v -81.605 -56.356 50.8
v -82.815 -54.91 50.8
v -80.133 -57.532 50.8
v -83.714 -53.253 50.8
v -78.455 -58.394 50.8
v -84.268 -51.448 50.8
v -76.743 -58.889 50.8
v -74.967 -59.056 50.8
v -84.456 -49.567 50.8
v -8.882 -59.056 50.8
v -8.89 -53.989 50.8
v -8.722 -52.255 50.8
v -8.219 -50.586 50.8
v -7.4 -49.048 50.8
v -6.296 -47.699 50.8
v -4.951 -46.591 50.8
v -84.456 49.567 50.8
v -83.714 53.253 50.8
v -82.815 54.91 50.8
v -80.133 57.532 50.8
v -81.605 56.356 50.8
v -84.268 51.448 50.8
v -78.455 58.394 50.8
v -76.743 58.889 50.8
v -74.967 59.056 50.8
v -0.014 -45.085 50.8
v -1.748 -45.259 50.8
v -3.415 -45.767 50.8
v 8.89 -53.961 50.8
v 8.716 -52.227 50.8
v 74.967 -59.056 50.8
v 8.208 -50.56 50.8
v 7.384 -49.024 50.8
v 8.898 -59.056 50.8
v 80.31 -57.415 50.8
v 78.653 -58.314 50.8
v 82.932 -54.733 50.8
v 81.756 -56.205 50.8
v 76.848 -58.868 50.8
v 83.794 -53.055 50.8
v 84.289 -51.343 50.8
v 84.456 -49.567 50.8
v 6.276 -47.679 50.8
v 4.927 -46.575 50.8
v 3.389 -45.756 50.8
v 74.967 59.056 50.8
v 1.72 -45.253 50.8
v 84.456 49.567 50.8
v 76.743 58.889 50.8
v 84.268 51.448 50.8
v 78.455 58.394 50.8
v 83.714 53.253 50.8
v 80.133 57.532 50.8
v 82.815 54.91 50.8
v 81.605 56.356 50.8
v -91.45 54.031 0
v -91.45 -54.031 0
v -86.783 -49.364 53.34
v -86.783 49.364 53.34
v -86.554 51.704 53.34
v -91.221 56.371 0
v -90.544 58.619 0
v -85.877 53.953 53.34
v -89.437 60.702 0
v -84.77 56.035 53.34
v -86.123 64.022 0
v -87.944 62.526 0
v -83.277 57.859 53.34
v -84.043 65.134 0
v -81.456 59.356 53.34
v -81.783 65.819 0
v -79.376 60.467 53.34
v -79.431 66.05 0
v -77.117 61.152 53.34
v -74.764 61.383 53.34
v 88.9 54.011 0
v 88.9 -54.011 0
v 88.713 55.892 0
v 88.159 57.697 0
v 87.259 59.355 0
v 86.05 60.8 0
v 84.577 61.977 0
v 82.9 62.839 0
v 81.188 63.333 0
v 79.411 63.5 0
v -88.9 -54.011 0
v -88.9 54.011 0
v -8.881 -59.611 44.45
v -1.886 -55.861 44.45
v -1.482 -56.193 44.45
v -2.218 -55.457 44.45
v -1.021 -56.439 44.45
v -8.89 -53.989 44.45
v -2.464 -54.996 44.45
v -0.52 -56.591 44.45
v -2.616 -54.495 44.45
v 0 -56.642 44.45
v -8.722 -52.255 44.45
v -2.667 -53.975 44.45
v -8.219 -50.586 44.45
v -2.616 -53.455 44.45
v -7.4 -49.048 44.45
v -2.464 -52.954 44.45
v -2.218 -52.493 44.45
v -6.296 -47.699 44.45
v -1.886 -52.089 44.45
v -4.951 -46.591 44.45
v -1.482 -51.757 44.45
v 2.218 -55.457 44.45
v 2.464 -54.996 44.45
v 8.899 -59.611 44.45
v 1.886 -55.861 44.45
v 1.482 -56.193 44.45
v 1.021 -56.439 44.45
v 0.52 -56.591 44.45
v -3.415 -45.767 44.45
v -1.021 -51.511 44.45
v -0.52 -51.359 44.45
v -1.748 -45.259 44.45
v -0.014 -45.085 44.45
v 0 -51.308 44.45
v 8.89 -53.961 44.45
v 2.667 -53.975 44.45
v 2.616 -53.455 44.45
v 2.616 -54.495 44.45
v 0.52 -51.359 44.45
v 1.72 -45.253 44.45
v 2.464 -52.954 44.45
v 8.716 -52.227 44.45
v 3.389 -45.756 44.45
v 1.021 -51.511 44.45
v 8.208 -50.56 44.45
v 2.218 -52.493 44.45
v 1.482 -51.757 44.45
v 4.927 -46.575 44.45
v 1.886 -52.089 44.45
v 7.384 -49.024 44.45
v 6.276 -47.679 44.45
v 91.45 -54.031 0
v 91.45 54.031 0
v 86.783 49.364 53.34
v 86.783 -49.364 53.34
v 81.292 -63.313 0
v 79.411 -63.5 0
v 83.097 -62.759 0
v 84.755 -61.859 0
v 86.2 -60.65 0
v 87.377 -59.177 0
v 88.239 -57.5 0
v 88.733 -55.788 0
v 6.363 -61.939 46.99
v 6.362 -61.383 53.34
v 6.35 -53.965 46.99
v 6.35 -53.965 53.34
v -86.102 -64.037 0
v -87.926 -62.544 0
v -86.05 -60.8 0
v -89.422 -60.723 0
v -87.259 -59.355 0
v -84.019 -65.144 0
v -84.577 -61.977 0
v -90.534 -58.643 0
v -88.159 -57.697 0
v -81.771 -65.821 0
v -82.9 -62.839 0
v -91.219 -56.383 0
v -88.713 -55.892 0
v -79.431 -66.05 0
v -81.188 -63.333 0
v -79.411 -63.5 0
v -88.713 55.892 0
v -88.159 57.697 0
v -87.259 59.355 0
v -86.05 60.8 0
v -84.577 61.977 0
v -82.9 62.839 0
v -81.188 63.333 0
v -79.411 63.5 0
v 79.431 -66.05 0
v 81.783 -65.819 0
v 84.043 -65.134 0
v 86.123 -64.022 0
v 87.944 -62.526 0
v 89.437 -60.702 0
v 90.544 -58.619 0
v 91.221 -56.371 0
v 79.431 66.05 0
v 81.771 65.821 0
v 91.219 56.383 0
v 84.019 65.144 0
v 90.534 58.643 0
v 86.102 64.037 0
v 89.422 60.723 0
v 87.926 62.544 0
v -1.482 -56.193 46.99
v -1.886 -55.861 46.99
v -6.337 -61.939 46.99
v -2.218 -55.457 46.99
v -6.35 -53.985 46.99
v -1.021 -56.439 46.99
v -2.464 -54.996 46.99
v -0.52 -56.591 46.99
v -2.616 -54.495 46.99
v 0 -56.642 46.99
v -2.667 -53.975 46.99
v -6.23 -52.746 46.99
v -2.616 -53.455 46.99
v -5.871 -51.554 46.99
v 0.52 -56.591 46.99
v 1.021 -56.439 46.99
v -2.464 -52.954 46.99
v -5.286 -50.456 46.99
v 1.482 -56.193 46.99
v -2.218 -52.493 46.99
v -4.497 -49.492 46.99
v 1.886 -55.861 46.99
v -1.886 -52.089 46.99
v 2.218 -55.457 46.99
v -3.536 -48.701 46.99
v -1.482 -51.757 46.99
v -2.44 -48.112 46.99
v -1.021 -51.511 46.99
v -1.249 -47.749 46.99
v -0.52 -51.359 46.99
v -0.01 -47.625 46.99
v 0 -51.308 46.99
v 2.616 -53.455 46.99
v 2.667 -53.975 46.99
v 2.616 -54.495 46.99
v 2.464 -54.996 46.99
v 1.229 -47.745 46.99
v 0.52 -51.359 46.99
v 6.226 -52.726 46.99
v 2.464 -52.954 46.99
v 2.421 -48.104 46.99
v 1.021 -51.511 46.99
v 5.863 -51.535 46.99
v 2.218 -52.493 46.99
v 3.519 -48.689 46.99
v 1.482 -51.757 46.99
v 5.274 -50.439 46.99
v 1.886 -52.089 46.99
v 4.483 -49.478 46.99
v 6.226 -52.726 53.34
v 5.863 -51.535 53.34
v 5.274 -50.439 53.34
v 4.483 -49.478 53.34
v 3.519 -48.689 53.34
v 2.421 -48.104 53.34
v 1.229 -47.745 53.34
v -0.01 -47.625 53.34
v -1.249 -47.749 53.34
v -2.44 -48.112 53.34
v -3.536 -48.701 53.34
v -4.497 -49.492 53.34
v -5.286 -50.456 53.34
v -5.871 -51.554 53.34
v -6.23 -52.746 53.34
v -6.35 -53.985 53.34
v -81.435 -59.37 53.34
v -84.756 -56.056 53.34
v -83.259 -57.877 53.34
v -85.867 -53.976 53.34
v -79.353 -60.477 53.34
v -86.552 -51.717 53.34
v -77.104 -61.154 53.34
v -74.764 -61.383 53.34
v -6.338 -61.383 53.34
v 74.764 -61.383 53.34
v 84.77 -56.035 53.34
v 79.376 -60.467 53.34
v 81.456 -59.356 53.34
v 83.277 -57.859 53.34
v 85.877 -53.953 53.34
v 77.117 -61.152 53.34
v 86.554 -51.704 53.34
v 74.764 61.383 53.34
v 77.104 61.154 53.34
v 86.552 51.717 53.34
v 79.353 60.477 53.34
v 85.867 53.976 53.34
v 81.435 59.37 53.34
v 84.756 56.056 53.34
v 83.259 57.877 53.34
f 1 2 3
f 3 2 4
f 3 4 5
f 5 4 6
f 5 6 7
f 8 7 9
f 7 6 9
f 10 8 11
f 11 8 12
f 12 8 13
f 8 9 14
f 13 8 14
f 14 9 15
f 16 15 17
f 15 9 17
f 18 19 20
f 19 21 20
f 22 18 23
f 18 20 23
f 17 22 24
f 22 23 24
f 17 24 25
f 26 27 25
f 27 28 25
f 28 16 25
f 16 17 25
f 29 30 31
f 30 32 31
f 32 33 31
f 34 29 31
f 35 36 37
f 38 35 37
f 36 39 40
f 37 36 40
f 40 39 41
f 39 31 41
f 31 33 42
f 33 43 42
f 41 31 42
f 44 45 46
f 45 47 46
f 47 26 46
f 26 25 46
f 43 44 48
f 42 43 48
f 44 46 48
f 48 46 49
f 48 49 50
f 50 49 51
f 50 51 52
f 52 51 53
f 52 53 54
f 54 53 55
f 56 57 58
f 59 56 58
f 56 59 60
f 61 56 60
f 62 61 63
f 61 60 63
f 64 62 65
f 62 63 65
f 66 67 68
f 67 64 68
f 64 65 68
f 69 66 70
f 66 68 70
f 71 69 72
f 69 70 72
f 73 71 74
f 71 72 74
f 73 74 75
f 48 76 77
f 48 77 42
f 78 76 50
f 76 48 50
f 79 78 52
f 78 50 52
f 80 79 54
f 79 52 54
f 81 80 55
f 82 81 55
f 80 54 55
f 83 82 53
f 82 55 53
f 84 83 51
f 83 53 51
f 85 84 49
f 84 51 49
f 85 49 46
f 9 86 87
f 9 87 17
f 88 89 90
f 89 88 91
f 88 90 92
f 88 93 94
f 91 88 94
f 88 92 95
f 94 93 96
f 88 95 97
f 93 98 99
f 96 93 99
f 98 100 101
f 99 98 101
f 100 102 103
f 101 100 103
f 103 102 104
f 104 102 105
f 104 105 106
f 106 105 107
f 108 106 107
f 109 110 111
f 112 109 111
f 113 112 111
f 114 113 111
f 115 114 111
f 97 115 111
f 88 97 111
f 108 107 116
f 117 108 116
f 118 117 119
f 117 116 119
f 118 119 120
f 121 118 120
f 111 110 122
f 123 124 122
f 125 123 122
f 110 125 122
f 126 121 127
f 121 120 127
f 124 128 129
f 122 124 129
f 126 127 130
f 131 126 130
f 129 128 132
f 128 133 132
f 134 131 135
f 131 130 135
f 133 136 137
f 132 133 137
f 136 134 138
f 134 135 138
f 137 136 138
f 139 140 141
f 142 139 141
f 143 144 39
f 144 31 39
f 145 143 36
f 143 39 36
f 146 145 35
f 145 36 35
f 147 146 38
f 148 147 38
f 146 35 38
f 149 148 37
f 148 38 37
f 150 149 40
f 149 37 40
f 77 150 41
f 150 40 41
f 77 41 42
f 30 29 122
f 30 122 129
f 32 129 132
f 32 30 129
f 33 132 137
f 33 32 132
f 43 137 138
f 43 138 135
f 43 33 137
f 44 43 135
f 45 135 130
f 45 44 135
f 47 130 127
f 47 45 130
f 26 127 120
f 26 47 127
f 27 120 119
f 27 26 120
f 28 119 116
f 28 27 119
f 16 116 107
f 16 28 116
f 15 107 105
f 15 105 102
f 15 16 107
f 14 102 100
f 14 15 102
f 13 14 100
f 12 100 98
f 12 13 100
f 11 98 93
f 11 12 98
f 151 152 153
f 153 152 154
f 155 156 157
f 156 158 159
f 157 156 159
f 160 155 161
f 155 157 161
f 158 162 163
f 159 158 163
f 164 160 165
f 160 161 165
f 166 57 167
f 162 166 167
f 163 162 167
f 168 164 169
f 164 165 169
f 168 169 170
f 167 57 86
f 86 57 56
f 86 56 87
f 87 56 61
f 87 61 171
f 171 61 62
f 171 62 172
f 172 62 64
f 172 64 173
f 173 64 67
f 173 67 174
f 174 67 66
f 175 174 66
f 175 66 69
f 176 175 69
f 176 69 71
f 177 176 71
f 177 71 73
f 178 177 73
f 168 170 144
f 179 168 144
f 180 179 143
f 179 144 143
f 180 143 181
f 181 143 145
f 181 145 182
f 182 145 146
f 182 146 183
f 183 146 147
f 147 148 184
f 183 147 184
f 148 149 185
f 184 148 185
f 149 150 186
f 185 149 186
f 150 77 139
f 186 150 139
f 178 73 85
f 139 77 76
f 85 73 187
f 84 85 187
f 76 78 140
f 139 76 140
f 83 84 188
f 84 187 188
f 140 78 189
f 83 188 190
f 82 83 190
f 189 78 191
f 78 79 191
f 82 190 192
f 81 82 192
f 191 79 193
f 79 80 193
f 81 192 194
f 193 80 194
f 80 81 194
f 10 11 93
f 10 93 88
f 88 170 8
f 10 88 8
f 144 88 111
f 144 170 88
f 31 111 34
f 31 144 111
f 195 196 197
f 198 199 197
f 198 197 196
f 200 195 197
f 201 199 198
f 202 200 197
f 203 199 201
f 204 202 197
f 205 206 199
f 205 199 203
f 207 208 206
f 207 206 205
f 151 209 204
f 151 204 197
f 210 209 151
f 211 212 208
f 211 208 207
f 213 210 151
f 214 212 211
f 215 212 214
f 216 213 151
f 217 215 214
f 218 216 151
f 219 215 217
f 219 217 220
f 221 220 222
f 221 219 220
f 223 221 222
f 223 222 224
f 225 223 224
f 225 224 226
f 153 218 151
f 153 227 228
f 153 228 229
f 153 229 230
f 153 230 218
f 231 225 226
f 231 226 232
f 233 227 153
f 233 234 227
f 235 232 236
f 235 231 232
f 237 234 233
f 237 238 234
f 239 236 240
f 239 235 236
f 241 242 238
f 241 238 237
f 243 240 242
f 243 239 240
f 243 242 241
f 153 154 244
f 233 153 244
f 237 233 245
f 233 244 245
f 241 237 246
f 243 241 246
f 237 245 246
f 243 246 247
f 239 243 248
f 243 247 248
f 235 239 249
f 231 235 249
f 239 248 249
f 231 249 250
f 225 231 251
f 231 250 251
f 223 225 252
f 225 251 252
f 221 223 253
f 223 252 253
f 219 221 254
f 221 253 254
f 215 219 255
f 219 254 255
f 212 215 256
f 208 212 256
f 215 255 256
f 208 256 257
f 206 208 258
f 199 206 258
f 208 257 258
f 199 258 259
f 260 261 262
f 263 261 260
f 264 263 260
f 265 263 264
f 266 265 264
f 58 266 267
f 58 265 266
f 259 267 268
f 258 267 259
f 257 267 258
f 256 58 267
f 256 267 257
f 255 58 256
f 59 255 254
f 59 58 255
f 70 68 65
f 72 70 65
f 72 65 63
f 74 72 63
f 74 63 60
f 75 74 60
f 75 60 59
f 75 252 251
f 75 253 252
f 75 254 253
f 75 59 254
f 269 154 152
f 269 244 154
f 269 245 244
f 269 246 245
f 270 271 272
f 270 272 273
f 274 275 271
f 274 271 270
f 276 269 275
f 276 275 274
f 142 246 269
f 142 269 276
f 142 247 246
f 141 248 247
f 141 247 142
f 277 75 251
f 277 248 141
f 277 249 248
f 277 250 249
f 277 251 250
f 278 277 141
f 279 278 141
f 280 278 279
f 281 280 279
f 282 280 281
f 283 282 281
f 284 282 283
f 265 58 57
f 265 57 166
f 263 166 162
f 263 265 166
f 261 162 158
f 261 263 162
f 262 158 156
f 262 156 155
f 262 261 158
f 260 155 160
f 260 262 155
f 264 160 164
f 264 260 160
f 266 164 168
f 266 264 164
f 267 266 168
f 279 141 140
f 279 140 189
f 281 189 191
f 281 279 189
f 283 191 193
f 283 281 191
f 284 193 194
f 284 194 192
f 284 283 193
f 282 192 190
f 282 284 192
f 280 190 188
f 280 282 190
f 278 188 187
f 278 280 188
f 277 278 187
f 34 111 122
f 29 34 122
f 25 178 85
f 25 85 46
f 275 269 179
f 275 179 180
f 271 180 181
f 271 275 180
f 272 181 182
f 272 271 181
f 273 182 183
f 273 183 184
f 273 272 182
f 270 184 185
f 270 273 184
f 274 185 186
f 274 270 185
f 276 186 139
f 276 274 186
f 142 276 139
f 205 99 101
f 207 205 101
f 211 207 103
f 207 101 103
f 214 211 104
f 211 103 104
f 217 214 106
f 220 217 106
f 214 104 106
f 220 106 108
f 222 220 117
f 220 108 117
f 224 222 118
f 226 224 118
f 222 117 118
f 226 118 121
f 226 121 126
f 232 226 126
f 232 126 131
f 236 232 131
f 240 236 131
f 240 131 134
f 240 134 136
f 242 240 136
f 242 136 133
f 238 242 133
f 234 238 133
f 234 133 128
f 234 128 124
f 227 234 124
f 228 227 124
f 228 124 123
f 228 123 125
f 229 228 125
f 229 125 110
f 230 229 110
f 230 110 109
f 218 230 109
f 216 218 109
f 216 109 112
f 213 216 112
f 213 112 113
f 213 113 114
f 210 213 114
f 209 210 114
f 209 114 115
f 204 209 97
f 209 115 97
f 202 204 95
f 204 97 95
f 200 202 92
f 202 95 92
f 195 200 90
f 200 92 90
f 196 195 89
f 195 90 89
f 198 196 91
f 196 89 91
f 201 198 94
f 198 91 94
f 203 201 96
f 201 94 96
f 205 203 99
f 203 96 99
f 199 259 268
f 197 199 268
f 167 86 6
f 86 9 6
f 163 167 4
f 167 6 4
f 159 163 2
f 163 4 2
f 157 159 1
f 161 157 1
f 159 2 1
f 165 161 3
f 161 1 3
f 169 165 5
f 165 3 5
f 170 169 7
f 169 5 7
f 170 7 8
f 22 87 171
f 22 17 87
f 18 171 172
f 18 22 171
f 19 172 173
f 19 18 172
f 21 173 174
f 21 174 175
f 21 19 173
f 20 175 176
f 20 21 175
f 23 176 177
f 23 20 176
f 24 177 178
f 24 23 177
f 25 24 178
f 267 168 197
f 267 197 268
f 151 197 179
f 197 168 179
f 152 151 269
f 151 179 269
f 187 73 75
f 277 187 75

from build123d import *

# Parameters (mm, degrees)
F0_W     = 177.8
F0_H     = 127
F1_DEPTH = 50.8
F1_TAPER = 5
F4_DEPTH = 6.35
F5_R     = 9.525
F6_T     = 2.54
F7_D     = 5.334


with BuildPart() as f1:
    # F0 (on Top) → F1 (new body)
    with BuildSketch(Plane.XY):
        Rectangle(F0_W, F0_H)
    extrude(amount=F1_DEPTH, taper=F1_TAPER)

    # F3 (on face) → F4 (cut)
    with BuildSketch(Plane.XY.offset(50.8)):
        with BuildLine():
            ThreePointArc((8.8899883424, -53.9606030597), (-0.0143969403, -45.0850116576), (-8.8899883424, -53.9893969403))
            Line((-8.8899883424, -53.9893969403), (-8.867513666, -67.8673187242))
            ThreePointArc((-8.867513666, -67.8673187242), (0.0368716166, -76.7429101263), (8.9124630188, -67.8385248437))
            Line((8.9124630188, -67.8385248437), (8.8899883424, -53.9606030597))
        make_face()
    extrude(amount=-F4_DEPTH, mode=Mode.SUBTRACT)

    # F5
    f5_edges = [f1.edges().sort_by_distance(p)[0] for p in [
        (-86.677788, 61.277788, 25.4),
        (-86.677788, -61.277788, 25.4),
        (86.677788, 61.277788, 25.4),
        (86.677788, -61.277788, 25.4),
    ]]
    fillet(f5_edges, radius=F5_R)

    # F6
    f6_openings = [f1.faces().sort_by_distance(p)[0] for p in [
        (0, 0, 0),
    ]]
    offset(amount=F6_T, openings=f6_openings, kind=Kind.INTERSECTION)

    # F7 (through all)
    with Locations(Plane.XY.offset(50.8)):
        with Locations((0, -53.975)):
            Hole(F7_D / 2)


solid = f1.part
